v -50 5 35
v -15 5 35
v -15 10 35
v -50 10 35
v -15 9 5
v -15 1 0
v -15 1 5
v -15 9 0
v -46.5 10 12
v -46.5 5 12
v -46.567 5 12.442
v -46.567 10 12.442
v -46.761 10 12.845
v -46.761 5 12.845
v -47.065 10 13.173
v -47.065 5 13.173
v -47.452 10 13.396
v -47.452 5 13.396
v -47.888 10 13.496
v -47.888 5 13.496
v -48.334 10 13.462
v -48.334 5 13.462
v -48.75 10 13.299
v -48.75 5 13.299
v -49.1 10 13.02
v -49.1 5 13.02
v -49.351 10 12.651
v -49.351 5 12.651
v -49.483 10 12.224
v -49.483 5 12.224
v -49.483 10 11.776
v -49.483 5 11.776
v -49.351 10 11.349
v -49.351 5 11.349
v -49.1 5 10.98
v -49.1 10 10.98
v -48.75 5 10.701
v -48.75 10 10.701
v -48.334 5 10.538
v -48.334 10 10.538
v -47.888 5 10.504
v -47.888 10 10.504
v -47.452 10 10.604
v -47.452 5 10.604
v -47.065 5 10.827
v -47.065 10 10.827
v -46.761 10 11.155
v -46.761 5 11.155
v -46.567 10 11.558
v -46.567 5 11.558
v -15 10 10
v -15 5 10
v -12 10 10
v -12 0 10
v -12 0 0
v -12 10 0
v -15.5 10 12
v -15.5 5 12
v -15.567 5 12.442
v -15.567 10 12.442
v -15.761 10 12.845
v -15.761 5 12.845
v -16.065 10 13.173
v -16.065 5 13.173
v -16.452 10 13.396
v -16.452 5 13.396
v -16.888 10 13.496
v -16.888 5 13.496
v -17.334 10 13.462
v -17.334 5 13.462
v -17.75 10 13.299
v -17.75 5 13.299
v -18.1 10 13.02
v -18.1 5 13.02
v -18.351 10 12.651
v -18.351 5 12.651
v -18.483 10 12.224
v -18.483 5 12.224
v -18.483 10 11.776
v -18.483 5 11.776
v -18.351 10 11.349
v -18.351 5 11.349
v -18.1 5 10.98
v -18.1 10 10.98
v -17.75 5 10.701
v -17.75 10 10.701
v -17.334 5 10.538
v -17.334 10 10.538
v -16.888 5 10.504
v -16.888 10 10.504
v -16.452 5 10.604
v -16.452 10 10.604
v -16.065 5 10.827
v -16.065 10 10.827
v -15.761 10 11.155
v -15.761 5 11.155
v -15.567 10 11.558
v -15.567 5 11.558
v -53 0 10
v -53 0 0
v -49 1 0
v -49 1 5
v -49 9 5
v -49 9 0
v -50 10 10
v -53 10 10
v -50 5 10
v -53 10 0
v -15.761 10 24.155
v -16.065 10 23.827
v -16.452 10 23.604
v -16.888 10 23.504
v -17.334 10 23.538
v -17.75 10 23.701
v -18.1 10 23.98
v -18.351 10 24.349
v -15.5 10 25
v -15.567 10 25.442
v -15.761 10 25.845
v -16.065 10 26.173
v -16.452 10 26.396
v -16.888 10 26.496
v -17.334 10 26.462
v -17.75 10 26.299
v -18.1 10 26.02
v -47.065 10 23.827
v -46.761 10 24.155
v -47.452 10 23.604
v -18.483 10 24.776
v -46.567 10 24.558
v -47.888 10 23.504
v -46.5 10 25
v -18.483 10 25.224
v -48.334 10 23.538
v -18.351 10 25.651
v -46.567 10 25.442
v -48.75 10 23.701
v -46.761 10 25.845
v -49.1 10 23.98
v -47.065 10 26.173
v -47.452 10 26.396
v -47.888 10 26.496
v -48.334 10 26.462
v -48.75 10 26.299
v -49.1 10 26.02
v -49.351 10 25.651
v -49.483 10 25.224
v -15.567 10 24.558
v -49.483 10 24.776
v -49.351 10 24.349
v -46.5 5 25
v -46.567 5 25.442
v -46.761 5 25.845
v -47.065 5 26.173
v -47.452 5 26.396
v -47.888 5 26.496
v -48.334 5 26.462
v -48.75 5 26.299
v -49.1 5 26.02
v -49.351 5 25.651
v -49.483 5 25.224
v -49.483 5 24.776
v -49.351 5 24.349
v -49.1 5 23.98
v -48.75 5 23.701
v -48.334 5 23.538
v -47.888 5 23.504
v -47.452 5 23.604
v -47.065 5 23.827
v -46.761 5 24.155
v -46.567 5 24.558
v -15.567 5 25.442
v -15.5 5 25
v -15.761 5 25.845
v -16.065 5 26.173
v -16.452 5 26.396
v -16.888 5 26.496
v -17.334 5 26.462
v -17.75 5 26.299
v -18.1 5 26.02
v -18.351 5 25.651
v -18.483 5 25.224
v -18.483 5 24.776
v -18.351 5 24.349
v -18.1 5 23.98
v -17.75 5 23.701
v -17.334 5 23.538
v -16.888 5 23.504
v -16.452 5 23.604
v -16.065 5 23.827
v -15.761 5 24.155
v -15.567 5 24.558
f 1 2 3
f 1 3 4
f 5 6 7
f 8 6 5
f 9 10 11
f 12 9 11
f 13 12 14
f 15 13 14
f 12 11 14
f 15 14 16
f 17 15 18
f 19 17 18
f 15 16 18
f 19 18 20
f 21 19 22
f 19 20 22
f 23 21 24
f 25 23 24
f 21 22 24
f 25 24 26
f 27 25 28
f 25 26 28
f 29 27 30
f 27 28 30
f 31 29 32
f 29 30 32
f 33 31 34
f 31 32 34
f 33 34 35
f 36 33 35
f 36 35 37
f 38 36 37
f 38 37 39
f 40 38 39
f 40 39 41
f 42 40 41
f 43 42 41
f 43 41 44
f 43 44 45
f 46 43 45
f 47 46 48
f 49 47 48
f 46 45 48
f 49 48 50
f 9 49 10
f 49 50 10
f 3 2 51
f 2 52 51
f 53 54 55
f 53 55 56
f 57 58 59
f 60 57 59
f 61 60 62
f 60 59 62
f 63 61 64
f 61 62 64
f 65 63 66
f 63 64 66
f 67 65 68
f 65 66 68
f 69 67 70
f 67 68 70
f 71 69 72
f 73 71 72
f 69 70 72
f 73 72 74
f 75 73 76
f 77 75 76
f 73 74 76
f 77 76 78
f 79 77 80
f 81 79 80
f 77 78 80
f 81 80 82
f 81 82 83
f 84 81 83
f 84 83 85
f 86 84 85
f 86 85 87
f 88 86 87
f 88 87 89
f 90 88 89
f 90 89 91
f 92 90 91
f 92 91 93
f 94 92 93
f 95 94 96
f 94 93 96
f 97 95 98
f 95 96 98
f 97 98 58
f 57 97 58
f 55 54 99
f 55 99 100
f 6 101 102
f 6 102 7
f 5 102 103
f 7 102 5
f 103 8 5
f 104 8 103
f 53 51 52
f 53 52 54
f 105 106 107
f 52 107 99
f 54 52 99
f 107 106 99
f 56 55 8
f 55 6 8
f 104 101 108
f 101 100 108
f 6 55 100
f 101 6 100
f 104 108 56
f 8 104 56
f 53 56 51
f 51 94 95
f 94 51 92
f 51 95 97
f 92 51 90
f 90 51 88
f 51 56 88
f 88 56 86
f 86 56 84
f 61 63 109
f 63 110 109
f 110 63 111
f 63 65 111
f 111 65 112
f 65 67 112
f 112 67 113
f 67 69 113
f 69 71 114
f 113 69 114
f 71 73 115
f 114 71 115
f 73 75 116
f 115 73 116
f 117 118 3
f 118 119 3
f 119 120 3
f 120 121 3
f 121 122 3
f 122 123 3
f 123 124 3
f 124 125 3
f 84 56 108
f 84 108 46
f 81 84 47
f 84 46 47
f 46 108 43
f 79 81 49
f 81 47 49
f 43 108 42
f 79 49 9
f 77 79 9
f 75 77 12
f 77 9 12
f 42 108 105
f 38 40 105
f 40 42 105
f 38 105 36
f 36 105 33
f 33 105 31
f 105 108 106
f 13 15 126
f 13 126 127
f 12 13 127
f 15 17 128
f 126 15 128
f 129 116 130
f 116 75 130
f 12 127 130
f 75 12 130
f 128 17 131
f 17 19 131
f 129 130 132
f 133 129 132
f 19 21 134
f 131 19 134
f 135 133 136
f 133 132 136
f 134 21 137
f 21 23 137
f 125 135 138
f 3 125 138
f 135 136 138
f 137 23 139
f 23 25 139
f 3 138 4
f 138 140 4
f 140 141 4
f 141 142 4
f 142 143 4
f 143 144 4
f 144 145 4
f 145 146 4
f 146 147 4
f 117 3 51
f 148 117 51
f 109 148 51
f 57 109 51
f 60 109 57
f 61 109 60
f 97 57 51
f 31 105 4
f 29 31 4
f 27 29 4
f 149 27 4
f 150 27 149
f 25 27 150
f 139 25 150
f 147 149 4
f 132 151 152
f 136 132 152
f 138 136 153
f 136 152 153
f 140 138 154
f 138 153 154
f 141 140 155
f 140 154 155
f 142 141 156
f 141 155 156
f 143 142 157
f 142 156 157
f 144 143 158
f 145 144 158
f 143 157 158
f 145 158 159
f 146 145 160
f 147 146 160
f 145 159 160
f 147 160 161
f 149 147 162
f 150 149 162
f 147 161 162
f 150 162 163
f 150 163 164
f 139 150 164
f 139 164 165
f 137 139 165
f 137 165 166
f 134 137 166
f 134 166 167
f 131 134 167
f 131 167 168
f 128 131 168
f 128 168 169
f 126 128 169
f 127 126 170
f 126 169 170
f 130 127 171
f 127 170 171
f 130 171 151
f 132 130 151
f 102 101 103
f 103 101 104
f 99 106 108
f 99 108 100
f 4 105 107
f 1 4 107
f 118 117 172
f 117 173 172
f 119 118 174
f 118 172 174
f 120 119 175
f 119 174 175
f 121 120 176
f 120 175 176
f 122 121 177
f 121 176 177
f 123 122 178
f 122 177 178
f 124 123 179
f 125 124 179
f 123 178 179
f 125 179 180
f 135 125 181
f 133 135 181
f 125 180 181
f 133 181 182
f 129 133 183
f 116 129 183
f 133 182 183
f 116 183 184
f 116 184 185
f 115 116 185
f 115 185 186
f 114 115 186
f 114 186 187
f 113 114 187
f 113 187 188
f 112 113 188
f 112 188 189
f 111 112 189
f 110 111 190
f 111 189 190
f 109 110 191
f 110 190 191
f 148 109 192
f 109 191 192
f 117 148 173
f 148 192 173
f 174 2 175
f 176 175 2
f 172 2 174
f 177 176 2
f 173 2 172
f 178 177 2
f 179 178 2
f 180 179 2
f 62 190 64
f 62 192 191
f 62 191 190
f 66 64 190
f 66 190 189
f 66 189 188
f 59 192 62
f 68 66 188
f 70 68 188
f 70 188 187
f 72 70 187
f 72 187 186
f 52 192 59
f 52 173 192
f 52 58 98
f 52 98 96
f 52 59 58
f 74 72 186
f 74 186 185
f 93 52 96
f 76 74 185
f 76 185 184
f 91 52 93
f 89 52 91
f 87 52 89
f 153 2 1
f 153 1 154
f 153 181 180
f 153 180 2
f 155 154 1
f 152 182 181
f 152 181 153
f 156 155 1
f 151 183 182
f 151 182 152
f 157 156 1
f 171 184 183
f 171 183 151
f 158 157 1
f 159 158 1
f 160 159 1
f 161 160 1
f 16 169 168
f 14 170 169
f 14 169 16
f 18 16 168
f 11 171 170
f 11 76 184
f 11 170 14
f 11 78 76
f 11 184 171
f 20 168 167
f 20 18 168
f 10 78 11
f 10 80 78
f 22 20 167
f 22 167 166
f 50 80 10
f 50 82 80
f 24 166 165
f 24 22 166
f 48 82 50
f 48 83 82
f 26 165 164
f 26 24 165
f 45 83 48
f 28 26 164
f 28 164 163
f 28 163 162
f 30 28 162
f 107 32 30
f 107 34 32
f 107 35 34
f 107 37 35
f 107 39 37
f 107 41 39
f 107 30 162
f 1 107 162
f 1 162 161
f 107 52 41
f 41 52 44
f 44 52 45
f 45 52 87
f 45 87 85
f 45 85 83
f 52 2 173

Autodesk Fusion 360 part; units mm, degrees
sketch "Sketch1" plane through (0, 0, 0) normal (0, 0, 1) x (1, 0, 0)
  line L0 (-50, 0) -> (-15, 0)
  line L1 (-15, 0) -> (-15, 10)
  line L2 (-15, 10) -> (-50, 10)
  line L3 (-50, 10) -> (-50, 0)
  dimension "d1" = 35
  dimension "d2" = 10
extrude "Extrude1" add sketch "Sketch1" along normal blind 10
sketch "Sketch2" plane through (0, 0, 10) normal (0, 0, 1) x (-1, 0, 0)
  line L0 (50, -10) -> (50, 0)
  line L1 (50, 0) -> (15, 0)
  line L2 (15, 0) -> (15, -10)
  line L3 (15, -10) -> (50, -10)
  line L4 (50, -10) -> (50, -5)
  line L5 (15, -5) -> (15, -10)
  line L6 (15, -5) -> (20, -5)
  line L7 (20, -5) -> (50, -5)
  line L8 (50, -10) -> (15, -10)
extrude "Extrude2" add sketch "Sketch2" along normal blind 25 contours L0 L2 L3 L4 L5 L6 L7 L8
sketch "Sketch3" plane through (0, 5, 0) normal (0, -1, 0) x (1, 0, 0)
  line L0 (-50, 10) -> (-15, 10)
  line L1 (-15, 10) -> (-15, 35)
  line L2 (-15, 35) -> (-50, 35)
  line L3 (-50, 35) -> (-50, 10)
  line L4 (-15, 10) -> (-17, 10)
  line L5 (-17, 10) -> (-17, 12)
  circle A0 centre (-17, 12) radius 1.5
  line L6 (-50, 10) -> (-48, 10)
  circle A1 centre (-48, 12) radius 1.5
  dimension "d7" = 2
  dimension "d8" = 2
  dimension "d9" = 3
  dimension "d10" = 2
  dimension "d11" = 3
extrude "Extrude3" cut sketch "Sketch3" against normal blind 15 contours A0 | A1
sketch "Sketch4" plane through (0, 5, 0) normal (0, -1, 0) x (1, 0, 0)
  circle A0 centre (-17, 12) radius 1.5
  circle A1 centre (-48, 12) radius 1.5
  line L0 (-50, 10) -> (-15, 10)
  line L1 (-15, 10) -> (-15, 35)
  line L2 (-15, 35) -> (-50, 35)
  line L3 (-50, 35) -> (-50, 10)
  line L4 (-17, 10) -> (-17, 25)
  line L5 (-48, 10) -> (-48, 25)
  circle A2 centre (-48, 25) radius 1.5
  circle A3 centre (-17, 25) radius 1.5
  dimension "d14" = 15
  dimension "d15" = 15
  dimension "d16" = 3
  dimension "d17" = 3
extrude "Extrude4" cut sketch "Sketch4" against normal blind 24 contours A2 | A3
sketch "Sketch5" plane through (0, 0, 0) normal (0, 0, -1) x (1, 0, 0)
  line L0 (-50, 0) -> (-50, -10)
  line L1 (-50, -10) -> (-15, -10)
  line L2 (-15, -10) -> (-15, 0)
  line L3 (-15, 0) -> (-50, 0)
sketch "Sketch6" plane through (-50, 0, 0) normal (-1, 0, 0) x (0, -1, 0)
  line L0 (-10, 0) -> (0, 0)
  line L1 (0, 0) -> (0, 10)
  line L2 (0, 10) -> (-5, 10)
  line L3 (-5, 10) -> (-5, 35)
  line L4 (-5, 35) -> (-10, 35)
  line L5 (-10, 35) -> (-10, 0)
  line L6 (0, 10) -> (-10, 10)
  line L7 (-10, 10) -> (-10, 0)
  line L8 (-10, 0) -> (0, 0)
  line L9 (0, 0) -> (0, 10)
extrude "Extrude5" add sketch "Sketch6" along normal blind 3 contours L0 L1 L2 L5 L6 L7 L8 L9
sketch "Sketch7" plane through (-15, 0, 0) normal (1, 0, 0) x (0, 1, 0)
  line L0 (0, 0) -> (10, 0)
  line L1 (10, 0) -> (10, 35)
  line L2 (10, 35) -> (5, 35)
  line L3 (5, 35) -> (5, 10)
  line L4 (5, 10) -> (0, 10)
  line L5 (0, 10) -> (0, 0)
  line L6 (0, 10) -> (10, 10)
  line L7 (10, 10) -> (10, 0)
  line L8 (10, 0) -> (0, 0)
  line L9 (0, 0) -> (0, 10)
extrude "Extrude6" add sketch "Sketch7" along normal blind 3 contours L0 L1 L4 L5 L6 L7 L8 L9
sketch "Sketch8" plane through (0, 0, 0) normal (0, 0, -1) x (1, 0, 0)
sketch "Sketch9" plane through (0, 0, 0) normal (0, 0, -1) x (1, 0, 0)
  line L0 (-53, -10) -> (-52, -10)
  line L1 (-52, -10) -> (-32, -10)
  line L2 (-32, -10) -> (-32, -5)
  line L3 (-32, -5) -> (-15, -5)
  line L4 (-32, -5) -> (-49, -5)
  line L5 (-49, -5) -> (-49, -1)
  line L6 (-49, -5) -> (-49, -9)
  line L7 (-49, -1) -> (-15, -1)
  line L8 (-15, -1) -> (-15, -9)
  line L9 (-15, -9) -> (-49, -9)
  dimension "d24" = 20
  dimension "d25" = 17
  dimension "d26" = 17
  dimension "d27" = 4
  dimension "d28" = 4
extrude "Extrude7" cut sketch "Sketch9" against normal blind 5
